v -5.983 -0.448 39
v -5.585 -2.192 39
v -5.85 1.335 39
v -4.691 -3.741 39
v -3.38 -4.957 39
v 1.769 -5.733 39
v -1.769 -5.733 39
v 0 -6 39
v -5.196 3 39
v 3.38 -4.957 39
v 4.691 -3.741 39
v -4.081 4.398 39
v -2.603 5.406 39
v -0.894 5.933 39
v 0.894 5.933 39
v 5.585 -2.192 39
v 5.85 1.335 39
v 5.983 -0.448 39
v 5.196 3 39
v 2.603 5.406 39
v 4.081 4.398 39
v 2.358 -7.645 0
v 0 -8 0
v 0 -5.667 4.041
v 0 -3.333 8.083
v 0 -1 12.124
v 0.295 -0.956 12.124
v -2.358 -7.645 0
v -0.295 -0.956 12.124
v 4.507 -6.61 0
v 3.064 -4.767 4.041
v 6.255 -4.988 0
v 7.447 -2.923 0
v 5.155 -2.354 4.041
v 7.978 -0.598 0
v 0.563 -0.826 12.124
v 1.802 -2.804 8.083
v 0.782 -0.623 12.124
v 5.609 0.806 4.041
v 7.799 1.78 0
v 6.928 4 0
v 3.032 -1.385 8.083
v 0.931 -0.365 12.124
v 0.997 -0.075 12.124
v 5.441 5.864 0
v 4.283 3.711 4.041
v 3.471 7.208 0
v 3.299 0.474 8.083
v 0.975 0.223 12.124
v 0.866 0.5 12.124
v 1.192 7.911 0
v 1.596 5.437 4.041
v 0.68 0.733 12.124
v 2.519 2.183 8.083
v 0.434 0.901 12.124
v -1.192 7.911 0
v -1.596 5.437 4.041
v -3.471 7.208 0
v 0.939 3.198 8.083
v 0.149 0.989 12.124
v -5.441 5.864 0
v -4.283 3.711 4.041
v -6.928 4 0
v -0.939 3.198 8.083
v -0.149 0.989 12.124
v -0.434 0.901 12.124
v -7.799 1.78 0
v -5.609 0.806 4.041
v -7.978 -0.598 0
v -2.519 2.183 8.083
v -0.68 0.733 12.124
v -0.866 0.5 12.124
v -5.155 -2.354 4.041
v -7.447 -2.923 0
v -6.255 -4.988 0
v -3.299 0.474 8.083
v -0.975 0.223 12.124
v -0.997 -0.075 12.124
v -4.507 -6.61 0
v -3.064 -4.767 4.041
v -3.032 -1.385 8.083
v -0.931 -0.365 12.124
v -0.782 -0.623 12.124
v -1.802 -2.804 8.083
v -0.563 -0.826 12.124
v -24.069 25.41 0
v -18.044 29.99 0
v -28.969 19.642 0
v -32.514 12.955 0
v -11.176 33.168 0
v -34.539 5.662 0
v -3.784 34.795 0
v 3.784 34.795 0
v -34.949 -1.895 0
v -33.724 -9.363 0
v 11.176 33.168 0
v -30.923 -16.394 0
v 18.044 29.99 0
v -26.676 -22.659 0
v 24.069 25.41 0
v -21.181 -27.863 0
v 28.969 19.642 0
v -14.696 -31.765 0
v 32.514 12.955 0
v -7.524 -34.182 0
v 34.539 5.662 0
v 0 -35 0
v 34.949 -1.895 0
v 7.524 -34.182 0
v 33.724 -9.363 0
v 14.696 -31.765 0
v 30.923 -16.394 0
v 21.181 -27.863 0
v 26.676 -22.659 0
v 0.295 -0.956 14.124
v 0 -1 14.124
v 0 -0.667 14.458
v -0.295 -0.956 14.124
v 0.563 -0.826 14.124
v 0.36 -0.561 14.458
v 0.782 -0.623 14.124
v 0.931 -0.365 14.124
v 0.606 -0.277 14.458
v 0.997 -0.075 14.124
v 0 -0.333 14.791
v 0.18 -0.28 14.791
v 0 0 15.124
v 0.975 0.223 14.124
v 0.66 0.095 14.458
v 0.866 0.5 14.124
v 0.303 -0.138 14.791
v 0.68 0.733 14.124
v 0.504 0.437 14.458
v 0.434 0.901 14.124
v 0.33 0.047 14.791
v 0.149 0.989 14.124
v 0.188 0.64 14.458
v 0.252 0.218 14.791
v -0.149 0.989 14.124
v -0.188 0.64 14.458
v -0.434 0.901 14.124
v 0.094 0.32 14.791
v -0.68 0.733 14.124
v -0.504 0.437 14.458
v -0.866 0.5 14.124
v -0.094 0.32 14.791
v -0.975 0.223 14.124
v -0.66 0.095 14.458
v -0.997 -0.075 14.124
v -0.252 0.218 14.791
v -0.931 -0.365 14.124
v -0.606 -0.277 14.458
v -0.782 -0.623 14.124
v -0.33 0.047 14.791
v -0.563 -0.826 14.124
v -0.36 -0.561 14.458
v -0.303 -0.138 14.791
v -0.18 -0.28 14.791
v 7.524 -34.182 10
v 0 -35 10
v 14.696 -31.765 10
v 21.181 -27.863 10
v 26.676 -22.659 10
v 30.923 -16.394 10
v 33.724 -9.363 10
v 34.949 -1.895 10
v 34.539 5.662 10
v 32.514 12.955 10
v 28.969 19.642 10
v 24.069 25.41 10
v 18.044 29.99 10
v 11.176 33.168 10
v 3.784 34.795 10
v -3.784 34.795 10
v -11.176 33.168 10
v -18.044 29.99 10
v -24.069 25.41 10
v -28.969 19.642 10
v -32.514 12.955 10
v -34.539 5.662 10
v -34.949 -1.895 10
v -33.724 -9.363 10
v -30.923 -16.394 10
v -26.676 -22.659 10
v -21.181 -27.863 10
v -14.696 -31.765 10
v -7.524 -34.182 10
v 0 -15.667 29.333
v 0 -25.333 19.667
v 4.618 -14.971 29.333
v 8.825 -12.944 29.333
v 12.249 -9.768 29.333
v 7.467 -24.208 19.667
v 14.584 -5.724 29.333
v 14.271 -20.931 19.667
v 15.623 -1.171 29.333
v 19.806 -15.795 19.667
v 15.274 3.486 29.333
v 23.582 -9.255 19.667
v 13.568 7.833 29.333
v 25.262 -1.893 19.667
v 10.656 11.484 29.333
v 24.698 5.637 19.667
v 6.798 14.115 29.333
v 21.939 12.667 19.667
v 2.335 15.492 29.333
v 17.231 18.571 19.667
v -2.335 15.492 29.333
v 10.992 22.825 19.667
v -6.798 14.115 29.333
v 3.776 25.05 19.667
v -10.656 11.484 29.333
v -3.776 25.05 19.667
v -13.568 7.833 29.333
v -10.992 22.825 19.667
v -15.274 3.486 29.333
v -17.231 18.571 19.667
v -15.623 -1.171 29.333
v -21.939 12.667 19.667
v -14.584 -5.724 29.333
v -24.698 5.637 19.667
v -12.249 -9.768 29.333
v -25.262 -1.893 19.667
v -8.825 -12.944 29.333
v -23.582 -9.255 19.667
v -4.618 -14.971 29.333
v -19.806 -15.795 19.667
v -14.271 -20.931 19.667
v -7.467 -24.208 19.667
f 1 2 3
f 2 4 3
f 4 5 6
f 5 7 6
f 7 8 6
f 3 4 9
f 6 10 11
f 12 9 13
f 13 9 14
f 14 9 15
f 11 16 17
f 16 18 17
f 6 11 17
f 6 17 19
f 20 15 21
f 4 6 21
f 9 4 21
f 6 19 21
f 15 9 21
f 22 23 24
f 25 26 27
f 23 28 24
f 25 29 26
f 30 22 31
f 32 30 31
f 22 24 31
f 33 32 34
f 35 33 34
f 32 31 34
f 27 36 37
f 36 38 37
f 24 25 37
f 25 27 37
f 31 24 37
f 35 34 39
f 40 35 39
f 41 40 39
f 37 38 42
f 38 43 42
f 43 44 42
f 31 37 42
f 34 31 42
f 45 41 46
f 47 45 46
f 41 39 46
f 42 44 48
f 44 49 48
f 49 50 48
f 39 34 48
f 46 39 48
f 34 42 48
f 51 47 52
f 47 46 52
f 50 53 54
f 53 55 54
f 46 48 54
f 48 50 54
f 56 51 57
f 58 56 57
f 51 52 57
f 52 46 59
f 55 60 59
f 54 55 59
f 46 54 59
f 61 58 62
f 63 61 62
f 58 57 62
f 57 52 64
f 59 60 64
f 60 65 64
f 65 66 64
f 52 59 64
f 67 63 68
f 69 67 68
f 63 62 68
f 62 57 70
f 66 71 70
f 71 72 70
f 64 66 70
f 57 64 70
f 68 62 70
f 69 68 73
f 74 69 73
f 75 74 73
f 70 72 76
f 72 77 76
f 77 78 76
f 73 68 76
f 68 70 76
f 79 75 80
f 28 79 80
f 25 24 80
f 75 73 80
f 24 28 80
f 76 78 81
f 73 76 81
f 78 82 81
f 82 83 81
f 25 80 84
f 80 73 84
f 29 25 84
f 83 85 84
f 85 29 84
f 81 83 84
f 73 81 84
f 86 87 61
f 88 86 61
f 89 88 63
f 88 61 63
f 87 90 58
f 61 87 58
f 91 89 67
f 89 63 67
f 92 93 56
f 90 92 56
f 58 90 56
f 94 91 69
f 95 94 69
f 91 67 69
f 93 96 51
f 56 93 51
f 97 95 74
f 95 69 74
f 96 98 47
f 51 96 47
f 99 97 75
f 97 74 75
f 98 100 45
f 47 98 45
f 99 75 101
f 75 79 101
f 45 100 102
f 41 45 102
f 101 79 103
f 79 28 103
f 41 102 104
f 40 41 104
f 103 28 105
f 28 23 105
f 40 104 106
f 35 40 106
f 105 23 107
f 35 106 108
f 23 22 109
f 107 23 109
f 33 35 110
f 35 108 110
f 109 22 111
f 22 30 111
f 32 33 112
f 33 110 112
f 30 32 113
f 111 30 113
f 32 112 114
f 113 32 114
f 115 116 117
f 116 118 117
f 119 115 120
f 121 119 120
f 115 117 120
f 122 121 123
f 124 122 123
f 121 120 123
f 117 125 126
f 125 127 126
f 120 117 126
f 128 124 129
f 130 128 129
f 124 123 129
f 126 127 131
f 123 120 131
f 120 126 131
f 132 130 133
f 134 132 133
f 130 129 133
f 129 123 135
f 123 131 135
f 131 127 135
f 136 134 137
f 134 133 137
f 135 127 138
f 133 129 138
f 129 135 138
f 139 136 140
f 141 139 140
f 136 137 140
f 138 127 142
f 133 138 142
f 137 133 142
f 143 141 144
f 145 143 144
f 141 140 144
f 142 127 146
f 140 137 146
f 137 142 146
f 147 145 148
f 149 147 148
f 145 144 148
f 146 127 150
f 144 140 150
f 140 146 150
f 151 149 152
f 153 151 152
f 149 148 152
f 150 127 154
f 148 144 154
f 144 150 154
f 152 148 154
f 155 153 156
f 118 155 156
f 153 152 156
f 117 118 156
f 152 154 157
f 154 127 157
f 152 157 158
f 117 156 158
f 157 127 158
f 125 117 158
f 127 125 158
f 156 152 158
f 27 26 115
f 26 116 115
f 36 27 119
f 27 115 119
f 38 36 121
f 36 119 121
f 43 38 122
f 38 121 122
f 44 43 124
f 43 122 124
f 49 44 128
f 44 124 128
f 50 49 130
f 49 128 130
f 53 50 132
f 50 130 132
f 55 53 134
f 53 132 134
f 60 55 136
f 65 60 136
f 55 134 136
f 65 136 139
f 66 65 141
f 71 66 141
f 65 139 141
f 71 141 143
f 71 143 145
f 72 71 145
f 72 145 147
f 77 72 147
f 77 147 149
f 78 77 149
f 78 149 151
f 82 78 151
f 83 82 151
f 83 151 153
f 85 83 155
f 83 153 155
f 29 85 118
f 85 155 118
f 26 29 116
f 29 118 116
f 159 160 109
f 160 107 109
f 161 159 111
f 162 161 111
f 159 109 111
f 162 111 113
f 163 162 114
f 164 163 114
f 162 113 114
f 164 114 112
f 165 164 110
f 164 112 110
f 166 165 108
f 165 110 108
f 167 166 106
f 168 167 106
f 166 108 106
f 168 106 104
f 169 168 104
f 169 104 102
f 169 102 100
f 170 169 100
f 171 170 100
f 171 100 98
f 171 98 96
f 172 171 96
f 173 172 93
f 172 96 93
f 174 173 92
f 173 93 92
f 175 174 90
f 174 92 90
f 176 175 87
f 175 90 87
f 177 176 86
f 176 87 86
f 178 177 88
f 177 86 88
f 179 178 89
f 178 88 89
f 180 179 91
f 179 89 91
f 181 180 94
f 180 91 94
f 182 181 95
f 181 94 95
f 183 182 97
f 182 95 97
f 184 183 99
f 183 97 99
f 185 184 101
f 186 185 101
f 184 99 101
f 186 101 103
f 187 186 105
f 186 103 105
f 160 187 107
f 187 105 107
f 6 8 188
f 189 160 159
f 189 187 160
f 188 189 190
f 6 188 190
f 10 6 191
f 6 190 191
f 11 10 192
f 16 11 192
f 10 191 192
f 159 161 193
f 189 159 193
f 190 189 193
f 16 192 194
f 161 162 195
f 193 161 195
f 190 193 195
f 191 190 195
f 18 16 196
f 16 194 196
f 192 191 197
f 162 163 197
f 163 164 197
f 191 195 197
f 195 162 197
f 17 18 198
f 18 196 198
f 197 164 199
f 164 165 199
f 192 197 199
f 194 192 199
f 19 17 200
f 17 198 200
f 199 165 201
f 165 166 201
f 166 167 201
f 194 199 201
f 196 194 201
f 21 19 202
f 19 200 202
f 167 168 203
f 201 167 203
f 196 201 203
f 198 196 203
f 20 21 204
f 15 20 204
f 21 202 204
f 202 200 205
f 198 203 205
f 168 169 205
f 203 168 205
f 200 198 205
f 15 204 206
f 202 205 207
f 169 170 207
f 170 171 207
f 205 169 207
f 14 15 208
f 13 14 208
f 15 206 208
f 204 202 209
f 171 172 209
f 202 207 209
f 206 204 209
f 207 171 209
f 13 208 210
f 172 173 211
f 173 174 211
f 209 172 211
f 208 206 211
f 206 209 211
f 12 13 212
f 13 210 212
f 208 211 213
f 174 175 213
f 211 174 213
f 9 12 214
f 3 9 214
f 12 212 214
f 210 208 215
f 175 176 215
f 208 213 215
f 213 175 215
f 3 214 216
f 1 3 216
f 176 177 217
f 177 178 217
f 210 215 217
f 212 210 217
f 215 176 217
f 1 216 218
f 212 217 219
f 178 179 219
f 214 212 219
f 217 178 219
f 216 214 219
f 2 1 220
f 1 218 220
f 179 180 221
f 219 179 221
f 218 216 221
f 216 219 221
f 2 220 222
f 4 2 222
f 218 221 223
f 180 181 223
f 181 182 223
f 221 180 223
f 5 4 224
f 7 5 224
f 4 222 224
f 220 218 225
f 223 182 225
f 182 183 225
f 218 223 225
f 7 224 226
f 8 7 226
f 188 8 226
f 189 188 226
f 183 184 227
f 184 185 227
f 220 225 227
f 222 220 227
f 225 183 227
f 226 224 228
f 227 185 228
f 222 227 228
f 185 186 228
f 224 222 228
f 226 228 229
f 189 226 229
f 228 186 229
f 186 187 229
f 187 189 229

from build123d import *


with BuildPart() as part:
    # Sketch → Revolution (revolve)
    with BuildSketch(Plane.YZ):
        Polygon((0, 39), (-6, 39), (-35, 10), (-35, 0), (-8, 0), (-1, 12.124356), (-1, 14.124356), (0, 15.124356), align=None)
    revolve(axis=Axis((0, 0, 0), (0, 0, 1)))


solid = part.part
